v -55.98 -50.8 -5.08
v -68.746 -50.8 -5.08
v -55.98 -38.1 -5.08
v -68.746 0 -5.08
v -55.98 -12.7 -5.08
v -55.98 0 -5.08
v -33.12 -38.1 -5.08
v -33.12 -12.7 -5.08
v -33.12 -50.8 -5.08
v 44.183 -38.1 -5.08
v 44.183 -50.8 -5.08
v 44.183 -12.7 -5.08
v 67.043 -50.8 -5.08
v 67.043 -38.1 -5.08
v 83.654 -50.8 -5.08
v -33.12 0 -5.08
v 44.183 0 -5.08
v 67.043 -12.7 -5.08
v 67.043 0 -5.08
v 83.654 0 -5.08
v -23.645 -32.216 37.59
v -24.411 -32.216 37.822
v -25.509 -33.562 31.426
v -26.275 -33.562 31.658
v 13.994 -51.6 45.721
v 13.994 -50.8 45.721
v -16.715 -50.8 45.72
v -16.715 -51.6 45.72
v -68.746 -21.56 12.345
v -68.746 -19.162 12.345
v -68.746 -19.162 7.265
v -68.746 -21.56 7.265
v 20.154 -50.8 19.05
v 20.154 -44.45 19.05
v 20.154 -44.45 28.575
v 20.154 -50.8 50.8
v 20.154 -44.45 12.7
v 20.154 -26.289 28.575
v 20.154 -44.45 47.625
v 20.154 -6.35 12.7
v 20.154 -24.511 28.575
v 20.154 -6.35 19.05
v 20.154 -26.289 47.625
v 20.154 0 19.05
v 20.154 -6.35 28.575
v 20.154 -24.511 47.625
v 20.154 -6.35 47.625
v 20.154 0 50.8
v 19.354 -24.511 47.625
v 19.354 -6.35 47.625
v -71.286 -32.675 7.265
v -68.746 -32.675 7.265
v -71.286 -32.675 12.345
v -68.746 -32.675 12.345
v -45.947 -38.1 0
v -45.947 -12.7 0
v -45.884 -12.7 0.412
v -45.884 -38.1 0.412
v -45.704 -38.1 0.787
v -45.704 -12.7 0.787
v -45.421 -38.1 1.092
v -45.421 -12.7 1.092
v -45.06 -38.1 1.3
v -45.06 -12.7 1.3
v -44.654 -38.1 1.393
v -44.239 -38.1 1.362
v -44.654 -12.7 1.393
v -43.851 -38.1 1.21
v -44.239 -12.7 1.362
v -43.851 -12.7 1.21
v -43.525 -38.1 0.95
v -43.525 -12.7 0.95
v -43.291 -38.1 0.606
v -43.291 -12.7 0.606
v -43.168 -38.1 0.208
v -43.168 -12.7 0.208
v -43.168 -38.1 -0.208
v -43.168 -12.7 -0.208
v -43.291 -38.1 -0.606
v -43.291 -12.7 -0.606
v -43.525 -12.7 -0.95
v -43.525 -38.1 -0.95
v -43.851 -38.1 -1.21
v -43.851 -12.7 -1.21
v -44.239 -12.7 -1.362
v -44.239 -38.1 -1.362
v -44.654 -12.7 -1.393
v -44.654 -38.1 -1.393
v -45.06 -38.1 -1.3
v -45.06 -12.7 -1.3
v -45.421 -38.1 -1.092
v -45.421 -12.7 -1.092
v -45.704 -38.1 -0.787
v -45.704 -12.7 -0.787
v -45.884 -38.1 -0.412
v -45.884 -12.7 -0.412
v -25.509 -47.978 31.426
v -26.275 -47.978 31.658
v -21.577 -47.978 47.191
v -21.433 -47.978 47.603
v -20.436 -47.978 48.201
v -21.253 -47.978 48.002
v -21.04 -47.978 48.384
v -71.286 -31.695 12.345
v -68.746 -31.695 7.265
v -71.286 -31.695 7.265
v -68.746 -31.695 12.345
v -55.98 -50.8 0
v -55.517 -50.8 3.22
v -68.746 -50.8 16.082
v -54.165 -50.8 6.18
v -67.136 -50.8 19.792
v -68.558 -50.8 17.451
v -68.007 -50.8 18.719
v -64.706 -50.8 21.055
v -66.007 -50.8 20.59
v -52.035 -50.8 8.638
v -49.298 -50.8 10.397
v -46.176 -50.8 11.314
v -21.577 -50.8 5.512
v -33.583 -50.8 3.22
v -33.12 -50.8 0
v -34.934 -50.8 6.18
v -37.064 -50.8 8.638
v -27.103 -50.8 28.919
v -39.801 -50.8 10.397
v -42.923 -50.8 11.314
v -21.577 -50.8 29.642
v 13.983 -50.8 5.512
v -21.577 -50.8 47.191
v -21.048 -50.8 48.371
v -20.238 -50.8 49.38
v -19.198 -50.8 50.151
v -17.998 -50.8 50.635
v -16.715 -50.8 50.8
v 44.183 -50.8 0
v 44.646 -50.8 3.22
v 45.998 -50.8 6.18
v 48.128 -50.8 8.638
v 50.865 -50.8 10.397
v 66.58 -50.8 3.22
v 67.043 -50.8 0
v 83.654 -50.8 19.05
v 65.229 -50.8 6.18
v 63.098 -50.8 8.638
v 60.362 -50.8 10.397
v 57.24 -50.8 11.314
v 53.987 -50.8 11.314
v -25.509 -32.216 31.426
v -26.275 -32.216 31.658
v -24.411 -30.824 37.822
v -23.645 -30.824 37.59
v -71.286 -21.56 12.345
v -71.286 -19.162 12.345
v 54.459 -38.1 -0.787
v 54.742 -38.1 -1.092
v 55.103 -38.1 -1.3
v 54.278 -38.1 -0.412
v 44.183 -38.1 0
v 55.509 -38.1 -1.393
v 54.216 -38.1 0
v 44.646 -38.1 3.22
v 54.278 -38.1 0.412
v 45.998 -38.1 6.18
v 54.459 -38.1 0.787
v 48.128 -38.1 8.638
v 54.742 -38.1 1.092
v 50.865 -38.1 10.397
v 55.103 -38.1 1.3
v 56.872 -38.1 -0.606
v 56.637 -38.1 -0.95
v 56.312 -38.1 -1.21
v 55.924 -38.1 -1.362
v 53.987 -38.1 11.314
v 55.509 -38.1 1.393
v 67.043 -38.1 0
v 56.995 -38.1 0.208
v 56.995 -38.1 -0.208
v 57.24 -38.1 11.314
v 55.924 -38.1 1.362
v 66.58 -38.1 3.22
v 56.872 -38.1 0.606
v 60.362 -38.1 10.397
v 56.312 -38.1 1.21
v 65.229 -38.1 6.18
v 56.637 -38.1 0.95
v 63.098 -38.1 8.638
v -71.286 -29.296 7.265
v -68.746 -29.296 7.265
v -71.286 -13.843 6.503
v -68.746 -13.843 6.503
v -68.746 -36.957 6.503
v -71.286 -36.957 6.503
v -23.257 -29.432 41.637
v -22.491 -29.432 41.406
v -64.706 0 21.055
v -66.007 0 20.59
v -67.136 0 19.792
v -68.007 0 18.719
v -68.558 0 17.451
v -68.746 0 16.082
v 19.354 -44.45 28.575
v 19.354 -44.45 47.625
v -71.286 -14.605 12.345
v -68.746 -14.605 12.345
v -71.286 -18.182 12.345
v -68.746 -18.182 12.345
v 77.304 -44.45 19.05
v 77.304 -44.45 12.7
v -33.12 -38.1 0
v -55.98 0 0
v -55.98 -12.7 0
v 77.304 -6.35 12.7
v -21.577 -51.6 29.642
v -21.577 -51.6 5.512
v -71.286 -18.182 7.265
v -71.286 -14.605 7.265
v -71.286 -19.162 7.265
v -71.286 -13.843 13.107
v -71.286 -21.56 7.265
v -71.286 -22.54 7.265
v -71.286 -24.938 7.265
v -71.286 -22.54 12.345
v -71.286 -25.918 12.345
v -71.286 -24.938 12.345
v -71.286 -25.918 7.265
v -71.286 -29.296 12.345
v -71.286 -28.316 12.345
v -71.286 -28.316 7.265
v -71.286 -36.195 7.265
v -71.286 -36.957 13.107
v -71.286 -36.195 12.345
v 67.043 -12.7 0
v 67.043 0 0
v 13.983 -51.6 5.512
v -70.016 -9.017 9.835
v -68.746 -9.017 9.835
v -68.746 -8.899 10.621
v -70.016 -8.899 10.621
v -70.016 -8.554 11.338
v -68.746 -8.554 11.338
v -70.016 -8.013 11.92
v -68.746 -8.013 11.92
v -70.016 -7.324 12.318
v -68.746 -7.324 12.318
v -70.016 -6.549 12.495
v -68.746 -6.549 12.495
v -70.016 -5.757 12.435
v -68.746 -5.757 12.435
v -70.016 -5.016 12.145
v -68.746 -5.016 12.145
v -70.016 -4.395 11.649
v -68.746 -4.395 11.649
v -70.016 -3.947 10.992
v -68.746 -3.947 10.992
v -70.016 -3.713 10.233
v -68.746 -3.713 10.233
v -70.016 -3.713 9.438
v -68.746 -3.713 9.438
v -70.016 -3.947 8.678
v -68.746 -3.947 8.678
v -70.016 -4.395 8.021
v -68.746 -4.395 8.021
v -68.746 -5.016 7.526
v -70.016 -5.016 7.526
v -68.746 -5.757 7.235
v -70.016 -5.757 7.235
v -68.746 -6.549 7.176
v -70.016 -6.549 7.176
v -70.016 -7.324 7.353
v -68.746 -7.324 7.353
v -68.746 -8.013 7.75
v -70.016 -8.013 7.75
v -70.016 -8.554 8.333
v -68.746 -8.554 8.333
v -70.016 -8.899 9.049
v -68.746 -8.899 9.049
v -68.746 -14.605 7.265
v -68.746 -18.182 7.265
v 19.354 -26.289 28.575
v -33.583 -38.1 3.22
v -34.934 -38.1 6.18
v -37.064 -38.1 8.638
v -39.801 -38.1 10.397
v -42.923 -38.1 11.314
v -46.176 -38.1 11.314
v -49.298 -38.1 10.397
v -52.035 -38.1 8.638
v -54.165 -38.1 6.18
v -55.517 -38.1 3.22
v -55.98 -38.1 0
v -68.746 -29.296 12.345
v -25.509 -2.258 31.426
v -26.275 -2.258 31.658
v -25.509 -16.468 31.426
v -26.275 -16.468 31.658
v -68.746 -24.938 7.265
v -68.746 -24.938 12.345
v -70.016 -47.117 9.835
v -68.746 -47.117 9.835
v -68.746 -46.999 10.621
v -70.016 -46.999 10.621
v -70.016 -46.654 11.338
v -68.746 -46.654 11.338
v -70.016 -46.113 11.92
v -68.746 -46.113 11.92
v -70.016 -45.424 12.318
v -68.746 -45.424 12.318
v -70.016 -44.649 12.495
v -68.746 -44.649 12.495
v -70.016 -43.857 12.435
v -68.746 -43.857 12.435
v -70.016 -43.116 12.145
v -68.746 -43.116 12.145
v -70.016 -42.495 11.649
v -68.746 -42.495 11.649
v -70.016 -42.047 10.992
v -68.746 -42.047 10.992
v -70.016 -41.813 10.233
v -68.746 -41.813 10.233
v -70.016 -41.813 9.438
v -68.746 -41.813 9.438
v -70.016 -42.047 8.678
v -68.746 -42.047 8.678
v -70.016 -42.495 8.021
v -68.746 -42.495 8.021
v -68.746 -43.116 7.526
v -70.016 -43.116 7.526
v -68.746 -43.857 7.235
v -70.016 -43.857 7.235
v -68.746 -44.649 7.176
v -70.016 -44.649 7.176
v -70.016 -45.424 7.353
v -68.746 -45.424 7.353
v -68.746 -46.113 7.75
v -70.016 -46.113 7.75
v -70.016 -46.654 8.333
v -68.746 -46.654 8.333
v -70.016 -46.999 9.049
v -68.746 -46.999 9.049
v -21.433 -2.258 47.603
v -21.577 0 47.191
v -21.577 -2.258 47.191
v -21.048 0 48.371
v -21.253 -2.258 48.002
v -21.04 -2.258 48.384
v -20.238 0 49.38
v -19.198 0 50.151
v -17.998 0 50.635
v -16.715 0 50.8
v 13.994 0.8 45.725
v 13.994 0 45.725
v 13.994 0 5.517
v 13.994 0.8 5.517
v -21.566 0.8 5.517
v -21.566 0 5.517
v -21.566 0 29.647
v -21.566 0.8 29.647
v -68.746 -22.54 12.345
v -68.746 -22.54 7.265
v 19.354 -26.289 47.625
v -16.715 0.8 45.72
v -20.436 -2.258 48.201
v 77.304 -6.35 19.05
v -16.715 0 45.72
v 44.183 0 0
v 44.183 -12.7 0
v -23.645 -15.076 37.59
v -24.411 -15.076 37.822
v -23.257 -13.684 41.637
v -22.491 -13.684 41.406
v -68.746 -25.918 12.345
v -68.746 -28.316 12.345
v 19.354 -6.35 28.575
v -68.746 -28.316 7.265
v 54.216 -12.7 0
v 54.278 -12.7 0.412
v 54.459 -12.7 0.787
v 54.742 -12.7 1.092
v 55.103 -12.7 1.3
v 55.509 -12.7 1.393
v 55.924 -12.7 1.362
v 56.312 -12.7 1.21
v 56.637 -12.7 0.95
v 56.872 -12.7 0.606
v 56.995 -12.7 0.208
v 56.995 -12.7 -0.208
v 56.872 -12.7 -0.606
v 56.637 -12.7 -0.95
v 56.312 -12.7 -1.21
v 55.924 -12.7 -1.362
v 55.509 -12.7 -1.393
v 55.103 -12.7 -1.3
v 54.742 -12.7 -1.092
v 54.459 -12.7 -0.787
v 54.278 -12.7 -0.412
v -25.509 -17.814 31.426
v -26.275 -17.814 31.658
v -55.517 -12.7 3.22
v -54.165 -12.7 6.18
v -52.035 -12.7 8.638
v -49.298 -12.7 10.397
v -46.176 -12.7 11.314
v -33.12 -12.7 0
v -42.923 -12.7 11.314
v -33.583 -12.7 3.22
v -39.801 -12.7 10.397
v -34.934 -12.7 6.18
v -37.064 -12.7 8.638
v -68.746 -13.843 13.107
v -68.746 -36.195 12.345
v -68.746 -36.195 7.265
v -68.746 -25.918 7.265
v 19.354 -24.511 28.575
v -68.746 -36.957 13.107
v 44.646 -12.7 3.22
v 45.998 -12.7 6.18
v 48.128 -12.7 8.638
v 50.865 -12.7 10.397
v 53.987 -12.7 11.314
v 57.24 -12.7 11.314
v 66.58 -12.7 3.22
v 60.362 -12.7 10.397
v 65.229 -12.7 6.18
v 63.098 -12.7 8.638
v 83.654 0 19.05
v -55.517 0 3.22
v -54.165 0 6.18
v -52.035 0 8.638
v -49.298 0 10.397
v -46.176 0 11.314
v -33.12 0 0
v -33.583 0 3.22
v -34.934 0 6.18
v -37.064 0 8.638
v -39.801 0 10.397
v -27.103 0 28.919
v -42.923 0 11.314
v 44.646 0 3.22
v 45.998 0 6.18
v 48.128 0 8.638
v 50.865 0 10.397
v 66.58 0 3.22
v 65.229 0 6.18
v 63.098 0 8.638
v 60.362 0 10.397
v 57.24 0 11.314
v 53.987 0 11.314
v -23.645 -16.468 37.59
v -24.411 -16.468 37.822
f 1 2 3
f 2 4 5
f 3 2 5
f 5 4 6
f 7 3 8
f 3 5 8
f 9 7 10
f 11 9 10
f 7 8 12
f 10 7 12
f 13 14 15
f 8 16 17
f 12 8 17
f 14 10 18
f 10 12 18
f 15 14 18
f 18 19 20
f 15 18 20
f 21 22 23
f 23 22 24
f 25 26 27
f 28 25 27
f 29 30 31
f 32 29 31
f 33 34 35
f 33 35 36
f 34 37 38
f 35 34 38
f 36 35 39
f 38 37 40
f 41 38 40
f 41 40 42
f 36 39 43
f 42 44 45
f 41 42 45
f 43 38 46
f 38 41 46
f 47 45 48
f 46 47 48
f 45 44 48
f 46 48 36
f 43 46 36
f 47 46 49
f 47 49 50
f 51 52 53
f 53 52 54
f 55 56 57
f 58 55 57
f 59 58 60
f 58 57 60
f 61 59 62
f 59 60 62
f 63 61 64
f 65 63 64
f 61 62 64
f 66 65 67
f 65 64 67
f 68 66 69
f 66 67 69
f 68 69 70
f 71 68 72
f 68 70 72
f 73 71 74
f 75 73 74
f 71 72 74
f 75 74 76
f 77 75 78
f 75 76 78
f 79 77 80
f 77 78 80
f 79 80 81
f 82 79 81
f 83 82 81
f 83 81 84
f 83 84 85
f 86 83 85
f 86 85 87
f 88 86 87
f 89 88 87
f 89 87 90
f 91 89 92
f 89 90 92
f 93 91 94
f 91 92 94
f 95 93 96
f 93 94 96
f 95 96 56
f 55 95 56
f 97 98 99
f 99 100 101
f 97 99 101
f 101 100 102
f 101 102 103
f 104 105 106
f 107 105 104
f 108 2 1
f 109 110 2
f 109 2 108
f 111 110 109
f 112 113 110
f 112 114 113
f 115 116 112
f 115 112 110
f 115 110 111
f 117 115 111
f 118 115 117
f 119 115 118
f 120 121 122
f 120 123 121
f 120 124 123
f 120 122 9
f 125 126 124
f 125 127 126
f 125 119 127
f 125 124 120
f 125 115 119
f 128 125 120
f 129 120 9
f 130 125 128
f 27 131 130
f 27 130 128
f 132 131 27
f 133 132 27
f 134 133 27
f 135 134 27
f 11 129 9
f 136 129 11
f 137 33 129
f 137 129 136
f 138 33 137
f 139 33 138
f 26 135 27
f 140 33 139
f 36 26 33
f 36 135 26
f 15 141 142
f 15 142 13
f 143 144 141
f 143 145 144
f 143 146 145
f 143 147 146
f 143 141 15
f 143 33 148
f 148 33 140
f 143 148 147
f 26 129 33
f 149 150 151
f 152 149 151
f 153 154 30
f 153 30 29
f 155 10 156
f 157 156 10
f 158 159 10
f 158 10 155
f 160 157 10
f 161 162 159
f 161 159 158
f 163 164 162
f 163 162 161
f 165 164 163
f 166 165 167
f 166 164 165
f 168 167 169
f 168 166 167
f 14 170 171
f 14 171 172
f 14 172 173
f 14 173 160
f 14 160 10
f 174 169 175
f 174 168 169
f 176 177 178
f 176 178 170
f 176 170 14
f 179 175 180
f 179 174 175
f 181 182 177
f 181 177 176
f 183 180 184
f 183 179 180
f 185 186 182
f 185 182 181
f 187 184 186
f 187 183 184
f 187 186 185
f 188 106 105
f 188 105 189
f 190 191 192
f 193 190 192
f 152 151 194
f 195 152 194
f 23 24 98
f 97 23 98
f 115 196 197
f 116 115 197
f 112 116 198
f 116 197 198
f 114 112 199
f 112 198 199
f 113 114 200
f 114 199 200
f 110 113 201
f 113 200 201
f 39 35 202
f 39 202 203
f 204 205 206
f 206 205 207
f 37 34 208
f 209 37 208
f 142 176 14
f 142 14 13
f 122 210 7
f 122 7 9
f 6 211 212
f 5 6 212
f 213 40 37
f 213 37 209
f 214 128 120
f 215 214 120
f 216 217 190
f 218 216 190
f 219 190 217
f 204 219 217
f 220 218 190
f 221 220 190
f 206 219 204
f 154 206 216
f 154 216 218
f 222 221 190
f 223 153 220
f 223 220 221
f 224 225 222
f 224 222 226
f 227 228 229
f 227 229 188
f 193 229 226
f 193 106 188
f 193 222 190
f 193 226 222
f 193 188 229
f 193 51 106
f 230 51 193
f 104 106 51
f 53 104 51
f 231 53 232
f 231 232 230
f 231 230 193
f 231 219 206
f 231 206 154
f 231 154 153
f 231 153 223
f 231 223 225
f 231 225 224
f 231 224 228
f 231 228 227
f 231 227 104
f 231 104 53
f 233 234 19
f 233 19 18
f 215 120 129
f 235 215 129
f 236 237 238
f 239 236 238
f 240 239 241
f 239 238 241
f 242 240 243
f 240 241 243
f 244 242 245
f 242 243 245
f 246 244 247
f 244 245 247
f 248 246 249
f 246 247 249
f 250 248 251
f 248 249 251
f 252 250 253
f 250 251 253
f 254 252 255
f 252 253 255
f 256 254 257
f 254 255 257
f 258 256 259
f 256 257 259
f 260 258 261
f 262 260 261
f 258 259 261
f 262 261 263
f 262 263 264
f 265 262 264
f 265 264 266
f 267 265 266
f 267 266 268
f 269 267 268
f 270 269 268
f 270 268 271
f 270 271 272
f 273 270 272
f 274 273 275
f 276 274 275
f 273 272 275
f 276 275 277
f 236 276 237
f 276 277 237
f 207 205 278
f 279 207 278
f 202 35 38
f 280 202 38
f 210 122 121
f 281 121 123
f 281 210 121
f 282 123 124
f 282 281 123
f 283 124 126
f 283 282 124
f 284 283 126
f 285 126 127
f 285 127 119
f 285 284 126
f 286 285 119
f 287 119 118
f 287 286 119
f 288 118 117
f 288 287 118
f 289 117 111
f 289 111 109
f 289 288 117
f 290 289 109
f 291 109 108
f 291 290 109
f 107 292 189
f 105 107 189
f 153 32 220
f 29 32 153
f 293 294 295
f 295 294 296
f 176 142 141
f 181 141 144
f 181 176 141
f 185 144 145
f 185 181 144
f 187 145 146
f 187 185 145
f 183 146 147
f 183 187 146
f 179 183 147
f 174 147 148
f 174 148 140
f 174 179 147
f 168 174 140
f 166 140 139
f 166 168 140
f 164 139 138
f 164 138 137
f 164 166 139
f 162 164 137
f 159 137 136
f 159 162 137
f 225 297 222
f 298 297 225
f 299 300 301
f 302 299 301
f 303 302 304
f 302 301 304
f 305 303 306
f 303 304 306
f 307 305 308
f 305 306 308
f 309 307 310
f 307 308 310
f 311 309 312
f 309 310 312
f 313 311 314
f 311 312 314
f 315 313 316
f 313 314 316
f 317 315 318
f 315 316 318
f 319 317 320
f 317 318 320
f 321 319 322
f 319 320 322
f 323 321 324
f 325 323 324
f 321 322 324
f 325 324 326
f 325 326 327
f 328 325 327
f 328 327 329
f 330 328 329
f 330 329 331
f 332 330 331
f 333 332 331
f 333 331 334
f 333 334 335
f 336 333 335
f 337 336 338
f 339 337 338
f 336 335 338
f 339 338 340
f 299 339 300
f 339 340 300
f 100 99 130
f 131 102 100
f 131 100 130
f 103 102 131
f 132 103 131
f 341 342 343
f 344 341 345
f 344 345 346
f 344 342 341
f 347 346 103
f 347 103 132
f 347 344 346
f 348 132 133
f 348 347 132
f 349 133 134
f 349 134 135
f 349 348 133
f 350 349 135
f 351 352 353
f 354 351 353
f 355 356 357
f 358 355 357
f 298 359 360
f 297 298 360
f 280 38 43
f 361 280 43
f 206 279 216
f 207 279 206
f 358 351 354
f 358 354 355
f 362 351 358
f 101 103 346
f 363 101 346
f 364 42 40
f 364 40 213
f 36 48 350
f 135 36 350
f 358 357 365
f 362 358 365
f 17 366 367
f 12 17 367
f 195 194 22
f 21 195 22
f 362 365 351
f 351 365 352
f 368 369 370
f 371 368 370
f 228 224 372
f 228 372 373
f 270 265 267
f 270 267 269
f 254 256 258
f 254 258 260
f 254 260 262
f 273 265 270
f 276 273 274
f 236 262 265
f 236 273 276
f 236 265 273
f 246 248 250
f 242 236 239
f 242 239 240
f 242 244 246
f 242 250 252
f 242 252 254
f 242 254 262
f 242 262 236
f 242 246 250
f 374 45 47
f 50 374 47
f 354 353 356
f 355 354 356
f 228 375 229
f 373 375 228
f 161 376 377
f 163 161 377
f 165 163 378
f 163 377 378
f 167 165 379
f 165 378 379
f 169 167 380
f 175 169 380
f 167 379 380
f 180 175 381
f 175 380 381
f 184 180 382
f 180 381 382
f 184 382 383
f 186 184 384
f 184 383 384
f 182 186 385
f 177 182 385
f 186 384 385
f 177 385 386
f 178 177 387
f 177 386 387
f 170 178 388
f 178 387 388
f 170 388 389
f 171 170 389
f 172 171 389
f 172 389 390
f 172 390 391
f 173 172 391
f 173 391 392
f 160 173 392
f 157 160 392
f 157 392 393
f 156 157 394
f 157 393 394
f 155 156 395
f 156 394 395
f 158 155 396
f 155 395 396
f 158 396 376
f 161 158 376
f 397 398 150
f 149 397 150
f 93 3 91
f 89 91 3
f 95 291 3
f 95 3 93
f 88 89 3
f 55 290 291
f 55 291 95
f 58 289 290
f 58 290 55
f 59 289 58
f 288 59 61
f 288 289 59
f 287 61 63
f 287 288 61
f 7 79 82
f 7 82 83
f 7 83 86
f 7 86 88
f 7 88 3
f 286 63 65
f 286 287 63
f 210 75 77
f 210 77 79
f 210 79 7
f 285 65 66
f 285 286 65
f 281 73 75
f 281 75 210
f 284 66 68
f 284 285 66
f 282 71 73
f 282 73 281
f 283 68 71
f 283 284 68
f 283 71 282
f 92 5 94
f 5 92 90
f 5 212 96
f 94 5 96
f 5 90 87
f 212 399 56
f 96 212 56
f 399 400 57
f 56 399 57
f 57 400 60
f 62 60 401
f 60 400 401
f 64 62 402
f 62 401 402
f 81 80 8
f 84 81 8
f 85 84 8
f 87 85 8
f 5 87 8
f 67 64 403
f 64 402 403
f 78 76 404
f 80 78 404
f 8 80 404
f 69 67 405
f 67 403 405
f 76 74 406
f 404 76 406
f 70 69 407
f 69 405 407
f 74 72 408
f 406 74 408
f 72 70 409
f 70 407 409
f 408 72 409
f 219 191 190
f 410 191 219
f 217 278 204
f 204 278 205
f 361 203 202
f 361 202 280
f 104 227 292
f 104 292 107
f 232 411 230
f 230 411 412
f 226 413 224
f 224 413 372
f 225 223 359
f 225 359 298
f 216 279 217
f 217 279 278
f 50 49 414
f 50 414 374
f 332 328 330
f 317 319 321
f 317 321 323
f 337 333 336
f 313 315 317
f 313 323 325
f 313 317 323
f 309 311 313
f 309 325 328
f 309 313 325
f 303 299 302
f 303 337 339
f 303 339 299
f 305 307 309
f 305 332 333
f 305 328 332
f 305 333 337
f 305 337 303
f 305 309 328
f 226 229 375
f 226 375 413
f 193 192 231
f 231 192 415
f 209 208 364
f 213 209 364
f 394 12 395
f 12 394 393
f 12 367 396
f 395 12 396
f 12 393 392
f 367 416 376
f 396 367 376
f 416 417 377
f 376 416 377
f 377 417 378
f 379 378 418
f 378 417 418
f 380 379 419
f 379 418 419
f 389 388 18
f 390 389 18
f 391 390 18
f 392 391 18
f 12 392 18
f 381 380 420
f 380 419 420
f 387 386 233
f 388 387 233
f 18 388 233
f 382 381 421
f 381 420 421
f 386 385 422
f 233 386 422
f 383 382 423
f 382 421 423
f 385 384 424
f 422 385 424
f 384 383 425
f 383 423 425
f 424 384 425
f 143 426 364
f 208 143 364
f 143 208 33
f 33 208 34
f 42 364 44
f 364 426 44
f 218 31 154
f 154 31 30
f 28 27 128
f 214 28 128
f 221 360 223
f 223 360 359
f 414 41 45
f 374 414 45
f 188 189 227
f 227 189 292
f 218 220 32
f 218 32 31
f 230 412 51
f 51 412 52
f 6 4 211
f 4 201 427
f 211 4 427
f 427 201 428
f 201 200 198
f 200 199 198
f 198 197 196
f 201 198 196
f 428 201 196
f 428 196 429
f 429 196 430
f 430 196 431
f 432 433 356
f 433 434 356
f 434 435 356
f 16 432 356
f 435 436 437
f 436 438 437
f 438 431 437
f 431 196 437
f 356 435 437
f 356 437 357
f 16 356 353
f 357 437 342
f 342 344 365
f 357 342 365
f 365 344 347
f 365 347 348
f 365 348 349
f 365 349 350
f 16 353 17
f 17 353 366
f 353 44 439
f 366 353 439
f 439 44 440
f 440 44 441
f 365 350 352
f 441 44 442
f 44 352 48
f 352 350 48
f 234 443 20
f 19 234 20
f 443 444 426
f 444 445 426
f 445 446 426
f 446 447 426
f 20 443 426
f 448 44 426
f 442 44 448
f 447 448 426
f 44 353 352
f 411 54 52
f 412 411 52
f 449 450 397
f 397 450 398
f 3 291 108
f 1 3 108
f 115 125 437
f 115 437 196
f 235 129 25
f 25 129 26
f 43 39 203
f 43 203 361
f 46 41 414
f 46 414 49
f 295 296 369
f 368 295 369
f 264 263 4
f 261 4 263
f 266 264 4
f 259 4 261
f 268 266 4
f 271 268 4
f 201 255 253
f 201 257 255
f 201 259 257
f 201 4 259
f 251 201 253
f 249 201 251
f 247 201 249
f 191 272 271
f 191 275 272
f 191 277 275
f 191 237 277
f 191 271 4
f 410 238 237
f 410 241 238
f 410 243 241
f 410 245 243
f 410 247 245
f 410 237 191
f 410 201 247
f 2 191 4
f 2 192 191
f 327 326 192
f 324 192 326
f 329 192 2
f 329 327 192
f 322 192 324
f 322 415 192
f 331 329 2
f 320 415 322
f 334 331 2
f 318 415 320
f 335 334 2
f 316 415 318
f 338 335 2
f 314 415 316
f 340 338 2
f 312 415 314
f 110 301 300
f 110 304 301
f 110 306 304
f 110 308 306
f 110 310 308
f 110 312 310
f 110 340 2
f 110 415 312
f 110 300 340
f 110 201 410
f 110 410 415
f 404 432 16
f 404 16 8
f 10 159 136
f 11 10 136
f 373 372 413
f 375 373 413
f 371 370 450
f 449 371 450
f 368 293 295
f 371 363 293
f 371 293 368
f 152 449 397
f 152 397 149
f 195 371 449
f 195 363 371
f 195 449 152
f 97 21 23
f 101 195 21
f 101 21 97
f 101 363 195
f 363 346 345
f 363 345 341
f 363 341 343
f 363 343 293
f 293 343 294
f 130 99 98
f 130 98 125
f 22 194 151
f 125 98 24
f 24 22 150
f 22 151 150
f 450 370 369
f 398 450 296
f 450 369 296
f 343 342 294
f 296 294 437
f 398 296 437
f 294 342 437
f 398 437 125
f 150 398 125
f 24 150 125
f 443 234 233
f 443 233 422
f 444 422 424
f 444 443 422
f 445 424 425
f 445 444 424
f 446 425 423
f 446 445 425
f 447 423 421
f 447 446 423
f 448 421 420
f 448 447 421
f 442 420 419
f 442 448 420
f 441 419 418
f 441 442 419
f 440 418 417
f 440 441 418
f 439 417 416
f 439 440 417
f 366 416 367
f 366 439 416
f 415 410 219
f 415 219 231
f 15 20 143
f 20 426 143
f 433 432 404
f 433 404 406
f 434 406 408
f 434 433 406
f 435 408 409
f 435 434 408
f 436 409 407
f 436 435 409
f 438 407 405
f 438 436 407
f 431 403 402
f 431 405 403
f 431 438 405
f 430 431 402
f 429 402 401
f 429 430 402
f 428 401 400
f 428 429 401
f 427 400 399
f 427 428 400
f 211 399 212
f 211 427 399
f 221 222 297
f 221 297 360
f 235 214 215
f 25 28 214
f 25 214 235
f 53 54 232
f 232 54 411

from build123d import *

# Parameters (mm, degrees)
F1_DEPTH    = 50.8
F2_W        = 57.15
F2_H        = 38.1
F3_DEPTH    = 6.35
F4_W        = 23.114
F4_H        = 6.604
F4_W_2      = 0.9801145643
F4_H_2      = 5.08
F5_DEPTH    = 2.54
F4_R        = 2.667
F6_DEPTH    = 1.27
F8_DEPTH    = 0.8001
F9_T1_DEPTH = 71.4372925246
F9_T3_DEPTH = 69.6542925277
F11_DEPTH   = 0.8001
F13_DEPTH   = 0.8001
F15_DEPTH   = 0.254
F16_W       = 18.161
F16_H       = 19.05
F17_DEPTH   = 0.8001
F18_DEPTH   = 50.8
F19_W       = 127
F19_H       = 25.4
F20_DEPTH   = 12.7
F21_DEPTH   = 5.08
F22_R       = 1.397
F23_R       = 1.397
F24_DEPTH   = 25.4


# Not quite as in the source:
# - a fillet or chamfer that OpenCascade refuses, or shapes differently, is made with other operations: its cross-section is extruded or revolved along the edge and cut away or added


with BuildPart() as f1:
    # F0 (on Front) → F1 (new body)
    with BuildSketch(Plane.XZ):
        with BuildLine():
            Line((-68.745650351, 20.2095657587), (-68.745650351, 0))
            Line((-68.745650351, 0), (-55.97953596, 0))
            ThreePointArc((-55.97953596, 0), (-44.54953596, 11.43), (-33.11953596, 0))
            Line((-33.11953596, 0), (44.1833575737, 0))
            ThreePointArc((44.1833575737, 0), (55.6133575737, 11.43), (67.0433575737, 0))
            Line((67.0433575737, 0), (83.654349649, 0))
            Line((83.654349649, 0), (83.654349649, 19.05))
            Line((83.654349649, 19.05), (20.154349649, 19.05))
            Line((20.154349649, 19.05), (20.154349649, 50.8))
            Line((20.154349649, 50.8), (-20.485650351, 50.8))
            Line((-20.485650351, 50.8), (-27.103371678, 28.9188353957))
            Line((-27.103371678, 28.9188353957), (-68.745650351, 20.2095657587))
        make_face()
        with BuildLine():
            ThreePointArc((-33.11953596, 0), (-44.54953596, 11.43), (-55.97953596, 0))
            Line((-55.97953596, 0), (-33.11953596, 0))
        make_face()
        with BuildLine():
            ThreePointArc((67.0433575737, 0), (55.6133575737, 11.43), (44.1833575737, 0))
            Line((44.1833575737, 0), (67.0433575737, 0))
        make_face()
    extrude(amount=F1_DEPTH)

    # F2 (on face) → F3 (cut)
    with BuildSketch(Plane.XY.offset(19.05)):
        with Locations((48.729349649, -25.4)):
            Rectangle(F2_W, F2_H)
    extrude(amount=-F3_DEPTH, mode=Mode.SUBTRACT)

    # F4 (on face) → F5 (join)
    with BuildSketch(Plane(origin=(-68.745650351, 0, 0), x_dir=(0, -1, 0), z_dir=(-1, 0, 0))):
        with Locations((25.4, 9.8053713022)):
            Rectangle(F4_W, F4_H)
        Polygon((36.195, 12.3453713022), (36.195, 7.2653713022), (32.6746520766, 7.2653713022), (31.6945375124, 7.2653713022), (29.2964520766, 7.2653713022), (28.3163375124, 7.2653713022), (25.9182520766, 7.2653713022), (24.9381375124, 7.2653713022), (22.5400520766, 7.2653713022), (21.5599375124, 7.2653713022), (19.1618520766, 7.2653713022), (18.1817375124, 7.2653713022), (14.605, 7.2653713022), (14.605, 12.3453713022), (18.1817375124, 12.3453713022), (19.1618520766, 12.3453713022), (21.5599375124, 12.3453713022), (22.5400520766, 12.3453713022), (24.9381375124, 12.3453713022), (25.9182520766, 12.3453713022), (28.3163375124, 12.3453713022), (29.2964520766, 12.3453713022), (31.6945375124, 12.3453713022), (32.6746520766, 12.3453713022), align=None, mode=Mode.SUBTRACT)
        with Locations((18.6717947945, 9.8053713022)):
            Rectangle(F4_W_2, F4_H_2)
        with Locations((22.0499947945, 9.8053713022)):
            Rectangle(F4_W_2, F4_H_2)
        with Locations((25.4281947945, 9.8053713022)):
            Rectangle(F4_W_2, F4_H_2)
        with Locations((28.8063947945, 9.8053713022)):
            Rectangle(F4_W_2, F4_H_2)
        with Locations((32.1845947945, 9.8053713022)):
            Rectangle(F4_W_2, F4_H_2)
    extrude(amount=F5_DEPTH)

    # F4 (on face) → F6 (join)
    with BuildSketch(Plane(origin=(-68.745650351, 0, 0), x_dir=(0, -1, 0), z_dir=(-1, 0, 0))):
        with Locations((6.35, 9.8351975903)):
            Circle(F4_R)
        with Locations((44.45, 9.8351975903)):
            Circle(F4_R)
    extrude(amount=F6_DEPTH)

    # F7 (on face) → F8 (cut)
    with BuildSketch(Plane(origin=(-32.8452255156, 0, 9.9336828416), x_dir=(0, -1, 0), z_dir=(-0.9571813038, 0, 0.2894891219))):
        Polygon((33.562220633, 22.6956736296), (47.9775152107, 22.6956736296), (47.9775152107, 40.2216736296), (2.2575152107, 40.2216736296), (2.2575152107, 22.6956736296), (16.4677330811, 22.6956736296), (15.0759897713, 29.1358400136), (13.6842464615, 33.1220440567), (16.4677330811, 29.1358400136), (17.814220633, 22.6956736296), (32.2157330811, 22.6956736296), (30.8239897713, 29.1358400136), (29.4322464615, 33.1220440567), (32.2157330811, 29.1358400136), align=None)
    extrude(amount=-F8_DEPTH, mode=Mode.SUBTRACT)

    # F9: fillet of radius 5.08 on 2 edges, made by hand

    # F9_s2 → F9_t1 (cut)
    with BuildSketch(Plane.XZ.offset(-10.3186462623)):
        with BuildLine():
            ThreePointArc((-64.7056051643, 21.0545205498), (-67.6083252331, 19.2854983904), (-68.745650351, 16.0821072538))
            Line((-68.745650351, 16.0821072538), (-68.745650351, 20.2095657587))
            Line((-68.745650351, 20.2095657587), (-64.7056051643, 21.0545205498))
        make_face()
    extrude(amount=F9_T1_DEPTH, mode=Mode.SUBTRACT)

    # F9_s4 → F9_t3 (cut)
    with BuildSketch(Plane.XZ.offset(-9.4271462638)):
        with BuildLine():
            ThreePointArc((-21.5772728687, 47.1906047393), (-19.74263992, 49.7990361653), (-16.7147918455, 50.8))
            Line((-16.7147918455, 50.8), (-20.485650351, 50.8))
            Line((-20.485650351, 50.8), (-21.5772728687, 47.1906047393))
        make_face()
    extrude(amount=F9_T3_DEPTH, mode=Mode.SUBTRACT)

    # F10 (on face) → F11 (join)
    with BuildSketch(Plane.XZ.offset(50.8)):
        Polygon((13.9938081476, 45.7206499122), (-16.7147918455, 45.72), (-21.5772728687, 29.6424496777), (-21.5772728687, 5.5124496777), (13.9827271313, 5.5124514391), align=None)
    extrude(amount=F11_DEPTH)

    # F12 (on face) → F13 (join)
    with BuildSketch(Plane(origin=(0, 0, 0), x_dir=(-1, 0, 0), z_dir=(0, 1, 0))):
        Polygon((21.566192252, 29.6467966337), (16.7147918455, 45.72), (-13.993807748, 45.7249966337), (-13.993807748, 5.5167966337), (21.566192252, 5.5167966337), align=None)
    extrude(amount=F13_DEPTH)

    # F14 (on face) → F15 (join)
    with BuildSketch(Plane(origin=(0, 0.8001, 0), x_dir=(-1, 0, 0), z_dir=(0, 1, 0))):
        Polygon((-11.5635488182, 29.6467966337), (18.8161898404, 29.6467966337), (14.9059221148, 43.1567057967), (-11.5635488182, 43.1567057967), align=None)
    extrude(amount=-F15_DEPTH)

    # F16 (on face) → F17 (cut)
    with BuildSketch(Plane.YZ.offset(20.154349649)):
        with Locations((-35.3695, 38.1)):
            Rectangle(F16_W, F16_H)
        with Locations((-15.4305, 38.1)):
            Rectangle(F16_W, F16_H)
    extrude(amount=-F17_DEPTH, mode=Mode.SUBTRACT)

    # F0 (on Front) → F18 (cut)
    with BuildSketch(Plane.XZ):
        with BuildLine():
            ThreePointArc((67.0433575737, 0), (55.6133575737, 11.43), (44.1833575737, 0))
            Line((44.1833575737, 0), (67.0433575737, 0))
        make_face()
        with BuildLine():
            ThreePointArc((-33.11953596, 0), (-44.54953596, 11.43), (-55.97953596, 0))
            Line((-55.97953596, 0), (-33.11953596, 0))
        make_face()
    extrude(amount=F18_DEPTH, mode=Mode.SUBTRACT)

    # F19 (on face) → F20 (join)
    with BuildSketch(Plane(origin=(0, 0, 0), x_dir=(1, 0, 0), z_dir=(0, 0, -1))):
        with Locations((6.3173042834, 25.4)):
            Rectangle(F19_W, F19_H)
    extrude(amount=-F20_DEPTH)

    # F21 (add): a face of the model
    f21_faces = [f1.faces().sort_by_distance(p)[0] for p in [
        (7.7936035623, -25.4, 0),
    ]]
    extrude(f21_faces, amount=F21_DEPTH)

    # F22 (on face) + F23 (on face) → F24 (cut)
    with BuildSketch(Plane(origin=(0, -12.7, 0), x_dir=(-1, 0, 0), z_dir=(0, 1, 0))):
        with Locations((-55.6133575737, 0)):
            Circle(F22_R)
    with BuildSketch(Plane(origin=(0, -12.7, 0), x_dir=(-1, 0, 0), z_dir=(0, 1, 0))):
        with Locations((44.54953596, 0)):
            Circle(F23_R)
    extrude(amount=-F24_DEPTH, mode=Mode.SUBTRACT)


solid = f1.part
